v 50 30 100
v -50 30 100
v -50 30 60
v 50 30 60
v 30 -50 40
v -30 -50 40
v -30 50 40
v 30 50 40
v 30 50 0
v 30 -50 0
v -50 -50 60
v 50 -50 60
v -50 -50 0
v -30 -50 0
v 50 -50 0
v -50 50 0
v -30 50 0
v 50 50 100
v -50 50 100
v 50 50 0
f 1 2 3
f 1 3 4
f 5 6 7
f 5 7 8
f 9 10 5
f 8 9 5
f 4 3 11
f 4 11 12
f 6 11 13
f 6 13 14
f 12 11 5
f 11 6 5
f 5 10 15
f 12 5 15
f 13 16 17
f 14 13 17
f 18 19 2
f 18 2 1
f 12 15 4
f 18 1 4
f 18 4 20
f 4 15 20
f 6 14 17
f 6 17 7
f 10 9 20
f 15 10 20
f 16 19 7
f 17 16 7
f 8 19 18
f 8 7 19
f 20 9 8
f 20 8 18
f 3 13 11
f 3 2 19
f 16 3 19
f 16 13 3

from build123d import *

# Parameters (mm, degrees)
F0_W     = 100
F0_H     = 100
F1_DEPTH = 100
F2_W     = 100
F2_H     = 80
F3_DEPTH = 40
F4_W     = 60
F4_H     = 40
F5_DEPTH = 2000


with BuildPart() as f1:
    # F0 (on Top) → F1 (new body)
    with BuildSketch(Plane.XY):
        Rectangle(F0_W, F0_H)
    extrude(amount=F1_DEPTH)

    # F2 (on face) → F3 (cut)
    with BuildSketch(Plane.XY.offset(100)):
        with Locations((0, -10)):
            Rectangle(F2_W, F2_H)
    extrude(amount=-F3_DEPTH, mode=Mode.SUBTRACT)

    # F4 (on face) → F5 (cut)
    with BuildSketch(Plane.XZ.offset(50)):
        with Locations((0, 20)):
            Rectangle(F4_W, F4_H)
    extrude(amount=-F5_DEPTH, mode=Mode.SUBTRACT)


solid = f1.part
